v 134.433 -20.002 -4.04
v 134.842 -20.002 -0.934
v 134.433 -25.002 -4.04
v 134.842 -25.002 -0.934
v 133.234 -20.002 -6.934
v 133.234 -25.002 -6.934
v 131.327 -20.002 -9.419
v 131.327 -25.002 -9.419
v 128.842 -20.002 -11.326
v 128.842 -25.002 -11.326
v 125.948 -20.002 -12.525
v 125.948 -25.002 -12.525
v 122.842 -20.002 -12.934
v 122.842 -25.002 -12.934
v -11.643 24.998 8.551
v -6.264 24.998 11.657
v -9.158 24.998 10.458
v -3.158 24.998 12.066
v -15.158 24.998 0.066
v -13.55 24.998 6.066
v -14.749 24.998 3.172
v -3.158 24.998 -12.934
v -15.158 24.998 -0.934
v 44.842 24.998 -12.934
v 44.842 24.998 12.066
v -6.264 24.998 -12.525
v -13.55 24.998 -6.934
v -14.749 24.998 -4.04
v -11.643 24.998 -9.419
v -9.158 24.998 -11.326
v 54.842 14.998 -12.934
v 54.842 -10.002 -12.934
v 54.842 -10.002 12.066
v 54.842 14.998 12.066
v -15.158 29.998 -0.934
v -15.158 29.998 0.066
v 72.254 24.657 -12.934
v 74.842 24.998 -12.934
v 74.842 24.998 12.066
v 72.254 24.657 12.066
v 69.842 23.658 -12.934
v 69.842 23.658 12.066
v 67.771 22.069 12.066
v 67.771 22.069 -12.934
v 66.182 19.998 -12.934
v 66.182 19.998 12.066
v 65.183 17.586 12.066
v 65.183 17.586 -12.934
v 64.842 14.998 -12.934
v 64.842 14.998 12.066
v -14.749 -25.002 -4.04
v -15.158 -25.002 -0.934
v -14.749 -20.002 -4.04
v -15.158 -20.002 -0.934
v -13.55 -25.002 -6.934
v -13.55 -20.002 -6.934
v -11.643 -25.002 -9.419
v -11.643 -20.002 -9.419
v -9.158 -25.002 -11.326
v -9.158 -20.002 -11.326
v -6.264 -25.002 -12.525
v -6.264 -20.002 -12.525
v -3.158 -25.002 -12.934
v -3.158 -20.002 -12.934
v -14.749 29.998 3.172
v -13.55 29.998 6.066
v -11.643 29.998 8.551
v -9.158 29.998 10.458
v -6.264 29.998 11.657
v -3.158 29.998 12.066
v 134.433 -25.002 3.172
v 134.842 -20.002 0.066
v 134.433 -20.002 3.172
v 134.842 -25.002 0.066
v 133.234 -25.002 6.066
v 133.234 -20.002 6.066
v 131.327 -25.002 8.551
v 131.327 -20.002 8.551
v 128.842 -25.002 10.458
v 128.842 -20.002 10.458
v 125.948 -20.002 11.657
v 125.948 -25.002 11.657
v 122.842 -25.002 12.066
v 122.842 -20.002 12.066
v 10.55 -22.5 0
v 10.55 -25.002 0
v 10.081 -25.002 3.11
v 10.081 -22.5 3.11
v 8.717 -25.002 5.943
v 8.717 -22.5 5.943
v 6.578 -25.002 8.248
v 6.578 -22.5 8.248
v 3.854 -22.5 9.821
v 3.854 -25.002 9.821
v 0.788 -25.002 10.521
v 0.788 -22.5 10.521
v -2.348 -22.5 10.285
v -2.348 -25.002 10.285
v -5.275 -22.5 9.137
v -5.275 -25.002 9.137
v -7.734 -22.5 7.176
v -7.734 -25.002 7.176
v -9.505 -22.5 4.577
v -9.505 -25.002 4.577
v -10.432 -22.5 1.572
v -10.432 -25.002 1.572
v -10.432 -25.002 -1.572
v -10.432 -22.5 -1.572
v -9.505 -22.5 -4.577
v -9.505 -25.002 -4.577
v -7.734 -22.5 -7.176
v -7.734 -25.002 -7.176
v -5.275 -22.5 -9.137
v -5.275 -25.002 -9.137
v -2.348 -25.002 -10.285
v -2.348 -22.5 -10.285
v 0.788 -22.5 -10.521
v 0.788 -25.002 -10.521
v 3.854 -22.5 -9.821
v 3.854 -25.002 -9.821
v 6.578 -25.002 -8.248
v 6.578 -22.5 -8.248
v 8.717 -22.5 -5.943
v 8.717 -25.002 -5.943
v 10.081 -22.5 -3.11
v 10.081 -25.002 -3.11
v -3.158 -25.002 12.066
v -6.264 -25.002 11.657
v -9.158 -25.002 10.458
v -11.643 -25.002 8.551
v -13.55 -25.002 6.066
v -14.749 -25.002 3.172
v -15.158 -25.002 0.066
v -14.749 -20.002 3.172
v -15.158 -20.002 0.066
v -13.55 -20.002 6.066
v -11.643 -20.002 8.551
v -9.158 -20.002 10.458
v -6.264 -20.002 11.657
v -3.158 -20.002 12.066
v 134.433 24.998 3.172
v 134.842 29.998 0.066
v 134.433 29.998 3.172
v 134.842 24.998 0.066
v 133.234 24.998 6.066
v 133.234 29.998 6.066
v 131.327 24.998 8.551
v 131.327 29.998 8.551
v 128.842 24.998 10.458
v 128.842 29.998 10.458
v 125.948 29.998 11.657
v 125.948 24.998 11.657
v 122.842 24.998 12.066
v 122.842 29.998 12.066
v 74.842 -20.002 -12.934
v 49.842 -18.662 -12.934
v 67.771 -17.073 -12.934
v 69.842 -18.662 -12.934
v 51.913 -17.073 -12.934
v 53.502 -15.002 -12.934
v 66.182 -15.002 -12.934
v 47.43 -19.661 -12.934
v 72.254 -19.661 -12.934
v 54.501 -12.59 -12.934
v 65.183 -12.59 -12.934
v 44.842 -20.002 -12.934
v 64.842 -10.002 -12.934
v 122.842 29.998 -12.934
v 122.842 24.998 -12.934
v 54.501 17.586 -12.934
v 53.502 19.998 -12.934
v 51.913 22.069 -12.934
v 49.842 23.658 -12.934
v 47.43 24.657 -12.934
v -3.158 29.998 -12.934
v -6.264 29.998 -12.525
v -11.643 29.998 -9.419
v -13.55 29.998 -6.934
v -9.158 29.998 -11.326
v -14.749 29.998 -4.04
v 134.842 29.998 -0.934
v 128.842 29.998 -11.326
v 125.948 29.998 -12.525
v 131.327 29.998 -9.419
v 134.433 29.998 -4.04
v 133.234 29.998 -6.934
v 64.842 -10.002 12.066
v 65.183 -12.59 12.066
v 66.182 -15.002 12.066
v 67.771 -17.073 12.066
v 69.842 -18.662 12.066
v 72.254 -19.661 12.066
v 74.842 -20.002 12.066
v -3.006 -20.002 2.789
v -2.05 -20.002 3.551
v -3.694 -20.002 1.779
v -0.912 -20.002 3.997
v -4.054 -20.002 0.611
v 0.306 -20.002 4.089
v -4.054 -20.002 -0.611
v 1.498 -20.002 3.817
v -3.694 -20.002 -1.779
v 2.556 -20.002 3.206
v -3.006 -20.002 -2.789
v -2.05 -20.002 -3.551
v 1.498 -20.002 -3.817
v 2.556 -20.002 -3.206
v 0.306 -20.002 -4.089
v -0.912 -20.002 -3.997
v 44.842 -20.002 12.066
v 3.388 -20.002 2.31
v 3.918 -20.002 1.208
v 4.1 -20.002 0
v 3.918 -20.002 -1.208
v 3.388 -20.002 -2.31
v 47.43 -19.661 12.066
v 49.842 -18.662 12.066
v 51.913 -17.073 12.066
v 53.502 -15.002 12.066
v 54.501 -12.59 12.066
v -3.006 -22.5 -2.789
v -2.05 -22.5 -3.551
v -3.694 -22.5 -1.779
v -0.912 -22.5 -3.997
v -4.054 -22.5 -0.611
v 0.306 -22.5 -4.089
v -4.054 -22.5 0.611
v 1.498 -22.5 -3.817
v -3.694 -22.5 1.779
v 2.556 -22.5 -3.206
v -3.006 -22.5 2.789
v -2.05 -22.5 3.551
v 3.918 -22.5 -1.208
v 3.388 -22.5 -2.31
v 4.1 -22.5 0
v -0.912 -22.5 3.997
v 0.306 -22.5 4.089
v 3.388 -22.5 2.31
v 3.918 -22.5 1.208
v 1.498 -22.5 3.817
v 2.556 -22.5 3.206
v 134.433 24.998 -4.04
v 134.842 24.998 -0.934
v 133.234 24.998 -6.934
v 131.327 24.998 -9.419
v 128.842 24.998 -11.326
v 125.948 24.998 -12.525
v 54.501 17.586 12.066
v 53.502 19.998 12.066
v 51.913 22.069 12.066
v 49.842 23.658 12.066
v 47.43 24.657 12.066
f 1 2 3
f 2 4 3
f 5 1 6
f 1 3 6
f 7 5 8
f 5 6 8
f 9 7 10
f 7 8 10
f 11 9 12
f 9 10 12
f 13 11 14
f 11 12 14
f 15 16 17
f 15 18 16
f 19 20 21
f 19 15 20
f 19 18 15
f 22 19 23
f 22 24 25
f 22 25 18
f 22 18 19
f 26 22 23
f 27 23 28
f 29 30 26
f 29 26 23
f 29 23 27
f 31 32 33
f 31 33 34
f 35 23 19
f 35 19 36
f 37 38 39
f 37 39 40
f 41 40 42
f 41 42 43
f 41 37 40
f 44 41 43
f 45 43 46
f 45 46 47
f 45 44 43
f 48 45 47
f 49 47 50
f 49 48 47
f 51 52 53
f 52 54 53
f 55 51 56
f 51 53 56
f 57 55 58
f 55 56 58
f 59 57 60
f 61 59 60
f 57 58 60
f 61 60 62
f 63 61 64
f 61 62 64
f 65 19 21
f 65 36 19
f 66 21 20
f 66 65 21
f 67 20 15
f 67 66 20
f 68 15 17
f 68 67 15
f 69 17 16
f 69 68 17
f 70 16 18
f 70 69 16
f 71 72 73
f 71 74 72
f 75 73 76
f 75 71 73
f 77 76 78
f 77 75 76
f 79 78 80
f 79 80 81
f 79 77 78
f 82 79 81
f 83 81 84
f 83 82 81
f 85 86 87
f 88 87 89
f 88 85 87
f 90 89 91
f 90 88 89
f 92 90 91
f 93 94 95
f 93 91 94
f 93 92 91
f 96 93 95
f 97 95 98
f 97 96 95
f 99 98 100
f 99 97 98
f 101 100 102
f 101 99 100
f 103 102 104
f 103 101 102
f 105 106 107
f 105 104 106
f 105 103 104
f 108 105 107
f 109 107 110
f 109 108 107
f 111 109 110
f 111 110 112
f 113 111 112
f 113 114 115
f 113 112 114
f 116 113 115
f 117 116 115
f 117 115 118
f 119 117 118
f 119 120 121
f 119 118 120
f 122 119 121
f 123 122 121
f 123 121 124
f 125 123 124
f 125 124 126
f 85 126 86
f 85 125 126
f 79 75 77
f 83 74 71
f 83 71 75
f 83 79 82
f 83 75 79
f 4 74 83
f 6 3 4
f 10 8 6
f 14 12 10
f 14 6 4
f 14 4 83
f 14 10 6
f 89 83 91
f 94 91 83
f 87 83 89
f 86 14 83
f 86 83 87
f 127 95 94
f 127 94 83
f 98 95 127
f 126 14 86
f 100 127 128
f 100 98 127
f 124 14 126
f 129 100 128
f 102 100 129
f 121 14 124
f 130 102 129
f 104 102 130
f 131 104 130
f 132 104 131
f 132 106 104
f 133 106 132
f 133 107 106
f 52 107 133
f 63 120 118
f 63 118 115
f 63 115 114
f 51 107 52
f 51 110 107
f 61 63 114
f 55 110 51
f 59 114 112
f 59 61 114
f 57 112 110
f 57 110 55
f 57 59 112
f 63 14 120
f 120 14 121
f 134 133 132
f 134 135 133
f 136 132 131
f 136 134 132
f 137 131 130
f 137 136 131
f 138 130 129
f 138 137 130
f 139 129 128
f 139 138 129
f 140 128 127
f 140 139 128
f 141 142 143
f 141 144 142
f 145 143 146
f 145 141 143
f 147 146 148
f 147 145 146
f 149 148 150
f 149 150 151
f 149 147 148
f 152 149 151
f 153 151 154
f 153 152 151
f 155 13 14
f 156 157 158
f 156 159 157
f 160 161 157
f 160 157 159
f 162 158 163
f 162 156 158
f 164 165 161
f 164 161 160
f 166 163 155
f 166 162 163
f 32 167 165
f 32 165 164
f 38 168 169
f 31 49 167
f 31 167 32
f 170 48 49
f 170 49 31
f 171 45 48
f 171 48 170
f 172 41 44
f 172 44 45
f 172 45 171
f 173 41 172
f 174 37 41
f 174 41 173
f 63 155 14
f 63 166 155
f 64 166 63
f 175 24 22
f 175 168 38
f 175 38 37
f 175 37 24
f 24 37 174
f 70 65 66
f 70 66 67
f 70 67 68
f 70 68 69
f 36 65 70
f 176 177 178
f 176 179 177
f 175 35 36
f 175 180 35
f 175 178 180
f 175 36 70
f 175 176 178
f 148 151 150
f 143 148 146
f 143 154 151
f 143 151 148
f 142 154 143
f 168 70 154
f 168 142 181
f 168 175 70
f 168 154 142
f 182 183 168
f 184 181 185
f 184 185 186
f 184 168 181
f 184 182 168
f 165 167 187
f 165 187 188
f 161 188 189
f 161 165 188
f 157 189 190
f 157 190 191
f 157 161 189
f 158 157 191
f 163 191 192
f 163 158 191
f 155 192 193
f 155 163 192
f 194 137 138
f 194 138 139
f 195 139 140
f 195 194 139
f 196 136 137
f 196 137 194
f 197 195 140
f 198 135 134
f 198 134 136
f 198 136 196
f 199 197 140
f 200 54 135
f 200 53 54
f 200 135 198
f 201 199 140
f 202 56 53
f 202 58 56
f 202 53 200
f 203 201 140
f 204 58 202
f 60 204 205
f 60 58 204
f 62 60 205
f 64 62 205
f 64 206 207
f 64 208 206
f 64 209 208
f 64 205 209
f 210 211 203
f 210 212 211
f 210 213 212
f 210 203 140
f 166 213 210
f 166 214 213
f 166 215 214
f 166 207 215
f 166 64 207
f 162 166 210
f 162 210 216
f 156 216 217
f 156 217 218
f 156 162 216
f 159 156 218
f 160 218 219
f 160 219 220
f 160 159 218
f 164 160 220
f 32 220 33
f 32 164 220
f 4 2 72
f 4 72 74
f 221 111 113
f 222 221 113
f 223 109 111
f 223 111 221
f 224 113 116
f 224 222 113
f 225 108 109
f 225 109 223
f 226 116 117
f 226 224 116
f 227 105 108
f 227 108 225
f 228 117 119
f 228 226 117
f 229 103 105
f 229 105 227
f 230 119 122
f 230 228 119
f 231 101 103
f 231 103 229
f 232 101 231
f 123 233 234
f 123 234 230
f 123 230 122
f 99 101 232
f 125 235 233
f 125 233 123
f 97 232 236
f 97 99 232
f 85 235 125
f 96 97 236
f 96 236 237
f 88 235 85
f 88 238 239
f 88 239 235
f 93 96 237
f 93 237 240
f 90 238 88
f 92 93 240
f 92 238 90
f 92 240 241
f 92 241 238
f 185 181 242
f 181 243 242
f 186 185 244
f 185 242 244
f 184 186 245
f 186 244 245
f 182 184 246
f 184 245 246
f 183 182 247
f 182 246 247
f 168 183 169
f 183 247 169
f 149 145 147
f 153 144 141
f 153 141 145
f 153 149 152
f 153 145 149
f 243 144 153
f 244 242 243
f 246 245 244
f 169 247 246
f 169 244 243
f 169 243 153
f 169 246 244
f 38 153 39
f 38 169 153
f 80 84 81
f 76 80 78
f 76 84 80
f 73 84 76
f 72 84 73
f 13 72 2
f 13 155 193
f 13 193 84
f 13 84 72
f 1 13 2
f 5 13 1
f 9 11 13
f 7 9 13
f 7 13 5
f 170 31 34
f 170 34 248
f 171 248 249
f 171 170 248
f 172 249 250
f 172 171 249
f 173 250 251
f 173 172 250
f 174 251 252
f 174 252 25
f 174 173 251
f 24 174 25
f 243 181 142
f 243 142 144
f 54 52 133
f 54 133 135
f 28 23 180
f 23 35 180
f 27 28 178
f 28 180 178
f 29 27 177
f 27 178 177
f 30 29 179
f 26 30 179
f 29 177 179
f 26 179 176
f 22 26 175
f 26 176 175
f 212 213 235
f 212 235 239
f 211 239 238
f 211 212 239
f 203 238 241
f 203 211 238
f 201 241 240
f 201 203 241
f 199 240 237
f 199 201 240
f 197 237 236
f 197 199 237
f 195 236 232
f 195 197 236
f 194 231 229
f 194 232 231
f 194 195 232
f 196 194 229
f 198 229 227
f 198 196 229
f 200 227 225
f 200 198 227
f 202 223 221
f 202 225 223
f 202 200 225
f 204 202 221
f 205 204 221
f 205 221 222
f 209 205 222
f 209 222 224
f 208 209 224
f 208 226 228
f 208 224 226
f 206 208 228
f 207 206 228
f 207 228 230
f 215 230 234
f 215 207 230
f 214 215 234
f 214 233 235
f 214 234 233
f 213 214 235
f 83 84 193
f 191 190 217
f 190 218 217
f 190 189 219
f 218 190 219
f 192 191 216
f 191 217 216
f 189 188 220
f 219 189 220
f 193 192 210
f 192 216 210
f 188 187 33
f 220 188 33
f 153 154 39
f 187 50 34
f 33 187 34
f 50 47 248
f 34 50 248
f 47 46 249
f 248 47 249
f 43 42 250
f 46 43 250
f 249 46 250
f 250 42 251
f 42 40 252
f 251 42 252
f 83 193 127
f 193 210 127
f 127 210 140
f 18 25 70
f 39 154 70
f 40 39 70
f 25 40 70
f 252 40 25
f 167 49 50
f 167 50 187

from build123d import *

# Parameters (mm, degrees)
CYLINDER018_R          = 4.1
CYLINDER018_DEPTH      = 10
CYLINDER018_ROLL_ANGLE = 90
CYLINDER016_R          = 10.55
CYLINDER016_DEPTH      = 10
CYLINDER016_ROLL_ANGLE = 90
PAD_DEPTH              = 25
FILLET004_R            = 12


with BuildPart() as cilindro018:
    # Cylinder018 → Cylinder018 (new body)
    with BuildSketch(Plane.XY):
        Circle(CYLINDER018_R)
    extrude(amount=CYLINDER018_DEPTH)


with BuildPart() as cilindro018_1:
    # Cylinder018 roll: moved
    add(cilindro018.part.rotate(Axis((0, 0, 0), (1, 0, 0)), CYLINDER018_ROLL_ANGLE))


with BuildPart() as cilindro018_2:
    # Cylinder018 placement: moved
    add(cilindro018_1.part.moved(Location((0, -14, 0))))


with BuildPart() as taladro_horm:
    # Cylinder016 → Cylinder016 (new body)
    with BuildSketch(Plane.XY):
        Circle(CYLINDER016_R)
    extrude(amount=CYLINDER016_DEPTH)


with BuildPart() as taladro_horm_1:
    # Cylinder016 roll: moved
    add(taladro_horm.part.rotate(Axis((0, 0, 0), (1, 0, 0)), CYLINDER016_ROLL_ANGLE))


with BuildPart() as taladro_horm_2:
    # Cylinder016 placement: moved
    add(taladro_horm_1.part.moved(Location((0, -22.5, 0))))

    # Fusion001: union Cilindro018
    add(cilindro018_2.part)


with BuildPart() as cut023003:
    # Sketch → Pad (new body)
    with BuildSketch(Plane.XY):
        with BuildLine():
            Line((-25, -30), (-25, -25))
            Line((-25, -25), (35, -25))
            ThreePointArc((35, -25), (42.071068, -22.071068), (45, -15))
            Line((45, -15), (45, 10))
            ThreePointArc((45, 10), (42.071068, 17.071068), (35, 20))
            Line((35, 20), (-25, 20))
            Line((-25, 20), (-25, 25))
            Line((-25, 25), (125, 25))
            Line((125, 25), (125, 20))
            Line((125, 20), (65, 20))
            ThreePointArc((65, 20), (57.928932, 17.071068), (55, 10))
            Line((55, 10), (55, -15))
            ThreePointArc((55, -15), (57.928932, -22.071068), (65, -25))
            Line((65, -25), (125, -25))
            Line((125, -25), (125, -30))
            Line((125, -30), (-25, -30))
        make_face()
    extrude(amount=PAD_DEPTH)

    # Fillet004
    fillet004_edges = [cut023003.edges().sort_by_distance(p)[0] for p in [
        (-25, -27.5, 0),
        (-25, -27.5, 25),
        (-25, 22.5, 0),
        (-25, 22.5, 25),
        (125, 22.5, 0),
        (125, 22.5, 25),
        (125, -27.5, 0),
        (125, -27.5, 25),
    ]]
    fillet(fillet004_edges, radius=FILLET004_R)


with BuildPart() as cut023003_1:
    # Fillet004 placement: moved
    add(cut023003.part.moved(Location((9.841811, 4.997794, -12.933897))))

    # Cut023003: cut Taladro-horm
    add(taladro_horm_2.part, mode=Mode.SUBTRACT)


solid = cut023003_1.part
